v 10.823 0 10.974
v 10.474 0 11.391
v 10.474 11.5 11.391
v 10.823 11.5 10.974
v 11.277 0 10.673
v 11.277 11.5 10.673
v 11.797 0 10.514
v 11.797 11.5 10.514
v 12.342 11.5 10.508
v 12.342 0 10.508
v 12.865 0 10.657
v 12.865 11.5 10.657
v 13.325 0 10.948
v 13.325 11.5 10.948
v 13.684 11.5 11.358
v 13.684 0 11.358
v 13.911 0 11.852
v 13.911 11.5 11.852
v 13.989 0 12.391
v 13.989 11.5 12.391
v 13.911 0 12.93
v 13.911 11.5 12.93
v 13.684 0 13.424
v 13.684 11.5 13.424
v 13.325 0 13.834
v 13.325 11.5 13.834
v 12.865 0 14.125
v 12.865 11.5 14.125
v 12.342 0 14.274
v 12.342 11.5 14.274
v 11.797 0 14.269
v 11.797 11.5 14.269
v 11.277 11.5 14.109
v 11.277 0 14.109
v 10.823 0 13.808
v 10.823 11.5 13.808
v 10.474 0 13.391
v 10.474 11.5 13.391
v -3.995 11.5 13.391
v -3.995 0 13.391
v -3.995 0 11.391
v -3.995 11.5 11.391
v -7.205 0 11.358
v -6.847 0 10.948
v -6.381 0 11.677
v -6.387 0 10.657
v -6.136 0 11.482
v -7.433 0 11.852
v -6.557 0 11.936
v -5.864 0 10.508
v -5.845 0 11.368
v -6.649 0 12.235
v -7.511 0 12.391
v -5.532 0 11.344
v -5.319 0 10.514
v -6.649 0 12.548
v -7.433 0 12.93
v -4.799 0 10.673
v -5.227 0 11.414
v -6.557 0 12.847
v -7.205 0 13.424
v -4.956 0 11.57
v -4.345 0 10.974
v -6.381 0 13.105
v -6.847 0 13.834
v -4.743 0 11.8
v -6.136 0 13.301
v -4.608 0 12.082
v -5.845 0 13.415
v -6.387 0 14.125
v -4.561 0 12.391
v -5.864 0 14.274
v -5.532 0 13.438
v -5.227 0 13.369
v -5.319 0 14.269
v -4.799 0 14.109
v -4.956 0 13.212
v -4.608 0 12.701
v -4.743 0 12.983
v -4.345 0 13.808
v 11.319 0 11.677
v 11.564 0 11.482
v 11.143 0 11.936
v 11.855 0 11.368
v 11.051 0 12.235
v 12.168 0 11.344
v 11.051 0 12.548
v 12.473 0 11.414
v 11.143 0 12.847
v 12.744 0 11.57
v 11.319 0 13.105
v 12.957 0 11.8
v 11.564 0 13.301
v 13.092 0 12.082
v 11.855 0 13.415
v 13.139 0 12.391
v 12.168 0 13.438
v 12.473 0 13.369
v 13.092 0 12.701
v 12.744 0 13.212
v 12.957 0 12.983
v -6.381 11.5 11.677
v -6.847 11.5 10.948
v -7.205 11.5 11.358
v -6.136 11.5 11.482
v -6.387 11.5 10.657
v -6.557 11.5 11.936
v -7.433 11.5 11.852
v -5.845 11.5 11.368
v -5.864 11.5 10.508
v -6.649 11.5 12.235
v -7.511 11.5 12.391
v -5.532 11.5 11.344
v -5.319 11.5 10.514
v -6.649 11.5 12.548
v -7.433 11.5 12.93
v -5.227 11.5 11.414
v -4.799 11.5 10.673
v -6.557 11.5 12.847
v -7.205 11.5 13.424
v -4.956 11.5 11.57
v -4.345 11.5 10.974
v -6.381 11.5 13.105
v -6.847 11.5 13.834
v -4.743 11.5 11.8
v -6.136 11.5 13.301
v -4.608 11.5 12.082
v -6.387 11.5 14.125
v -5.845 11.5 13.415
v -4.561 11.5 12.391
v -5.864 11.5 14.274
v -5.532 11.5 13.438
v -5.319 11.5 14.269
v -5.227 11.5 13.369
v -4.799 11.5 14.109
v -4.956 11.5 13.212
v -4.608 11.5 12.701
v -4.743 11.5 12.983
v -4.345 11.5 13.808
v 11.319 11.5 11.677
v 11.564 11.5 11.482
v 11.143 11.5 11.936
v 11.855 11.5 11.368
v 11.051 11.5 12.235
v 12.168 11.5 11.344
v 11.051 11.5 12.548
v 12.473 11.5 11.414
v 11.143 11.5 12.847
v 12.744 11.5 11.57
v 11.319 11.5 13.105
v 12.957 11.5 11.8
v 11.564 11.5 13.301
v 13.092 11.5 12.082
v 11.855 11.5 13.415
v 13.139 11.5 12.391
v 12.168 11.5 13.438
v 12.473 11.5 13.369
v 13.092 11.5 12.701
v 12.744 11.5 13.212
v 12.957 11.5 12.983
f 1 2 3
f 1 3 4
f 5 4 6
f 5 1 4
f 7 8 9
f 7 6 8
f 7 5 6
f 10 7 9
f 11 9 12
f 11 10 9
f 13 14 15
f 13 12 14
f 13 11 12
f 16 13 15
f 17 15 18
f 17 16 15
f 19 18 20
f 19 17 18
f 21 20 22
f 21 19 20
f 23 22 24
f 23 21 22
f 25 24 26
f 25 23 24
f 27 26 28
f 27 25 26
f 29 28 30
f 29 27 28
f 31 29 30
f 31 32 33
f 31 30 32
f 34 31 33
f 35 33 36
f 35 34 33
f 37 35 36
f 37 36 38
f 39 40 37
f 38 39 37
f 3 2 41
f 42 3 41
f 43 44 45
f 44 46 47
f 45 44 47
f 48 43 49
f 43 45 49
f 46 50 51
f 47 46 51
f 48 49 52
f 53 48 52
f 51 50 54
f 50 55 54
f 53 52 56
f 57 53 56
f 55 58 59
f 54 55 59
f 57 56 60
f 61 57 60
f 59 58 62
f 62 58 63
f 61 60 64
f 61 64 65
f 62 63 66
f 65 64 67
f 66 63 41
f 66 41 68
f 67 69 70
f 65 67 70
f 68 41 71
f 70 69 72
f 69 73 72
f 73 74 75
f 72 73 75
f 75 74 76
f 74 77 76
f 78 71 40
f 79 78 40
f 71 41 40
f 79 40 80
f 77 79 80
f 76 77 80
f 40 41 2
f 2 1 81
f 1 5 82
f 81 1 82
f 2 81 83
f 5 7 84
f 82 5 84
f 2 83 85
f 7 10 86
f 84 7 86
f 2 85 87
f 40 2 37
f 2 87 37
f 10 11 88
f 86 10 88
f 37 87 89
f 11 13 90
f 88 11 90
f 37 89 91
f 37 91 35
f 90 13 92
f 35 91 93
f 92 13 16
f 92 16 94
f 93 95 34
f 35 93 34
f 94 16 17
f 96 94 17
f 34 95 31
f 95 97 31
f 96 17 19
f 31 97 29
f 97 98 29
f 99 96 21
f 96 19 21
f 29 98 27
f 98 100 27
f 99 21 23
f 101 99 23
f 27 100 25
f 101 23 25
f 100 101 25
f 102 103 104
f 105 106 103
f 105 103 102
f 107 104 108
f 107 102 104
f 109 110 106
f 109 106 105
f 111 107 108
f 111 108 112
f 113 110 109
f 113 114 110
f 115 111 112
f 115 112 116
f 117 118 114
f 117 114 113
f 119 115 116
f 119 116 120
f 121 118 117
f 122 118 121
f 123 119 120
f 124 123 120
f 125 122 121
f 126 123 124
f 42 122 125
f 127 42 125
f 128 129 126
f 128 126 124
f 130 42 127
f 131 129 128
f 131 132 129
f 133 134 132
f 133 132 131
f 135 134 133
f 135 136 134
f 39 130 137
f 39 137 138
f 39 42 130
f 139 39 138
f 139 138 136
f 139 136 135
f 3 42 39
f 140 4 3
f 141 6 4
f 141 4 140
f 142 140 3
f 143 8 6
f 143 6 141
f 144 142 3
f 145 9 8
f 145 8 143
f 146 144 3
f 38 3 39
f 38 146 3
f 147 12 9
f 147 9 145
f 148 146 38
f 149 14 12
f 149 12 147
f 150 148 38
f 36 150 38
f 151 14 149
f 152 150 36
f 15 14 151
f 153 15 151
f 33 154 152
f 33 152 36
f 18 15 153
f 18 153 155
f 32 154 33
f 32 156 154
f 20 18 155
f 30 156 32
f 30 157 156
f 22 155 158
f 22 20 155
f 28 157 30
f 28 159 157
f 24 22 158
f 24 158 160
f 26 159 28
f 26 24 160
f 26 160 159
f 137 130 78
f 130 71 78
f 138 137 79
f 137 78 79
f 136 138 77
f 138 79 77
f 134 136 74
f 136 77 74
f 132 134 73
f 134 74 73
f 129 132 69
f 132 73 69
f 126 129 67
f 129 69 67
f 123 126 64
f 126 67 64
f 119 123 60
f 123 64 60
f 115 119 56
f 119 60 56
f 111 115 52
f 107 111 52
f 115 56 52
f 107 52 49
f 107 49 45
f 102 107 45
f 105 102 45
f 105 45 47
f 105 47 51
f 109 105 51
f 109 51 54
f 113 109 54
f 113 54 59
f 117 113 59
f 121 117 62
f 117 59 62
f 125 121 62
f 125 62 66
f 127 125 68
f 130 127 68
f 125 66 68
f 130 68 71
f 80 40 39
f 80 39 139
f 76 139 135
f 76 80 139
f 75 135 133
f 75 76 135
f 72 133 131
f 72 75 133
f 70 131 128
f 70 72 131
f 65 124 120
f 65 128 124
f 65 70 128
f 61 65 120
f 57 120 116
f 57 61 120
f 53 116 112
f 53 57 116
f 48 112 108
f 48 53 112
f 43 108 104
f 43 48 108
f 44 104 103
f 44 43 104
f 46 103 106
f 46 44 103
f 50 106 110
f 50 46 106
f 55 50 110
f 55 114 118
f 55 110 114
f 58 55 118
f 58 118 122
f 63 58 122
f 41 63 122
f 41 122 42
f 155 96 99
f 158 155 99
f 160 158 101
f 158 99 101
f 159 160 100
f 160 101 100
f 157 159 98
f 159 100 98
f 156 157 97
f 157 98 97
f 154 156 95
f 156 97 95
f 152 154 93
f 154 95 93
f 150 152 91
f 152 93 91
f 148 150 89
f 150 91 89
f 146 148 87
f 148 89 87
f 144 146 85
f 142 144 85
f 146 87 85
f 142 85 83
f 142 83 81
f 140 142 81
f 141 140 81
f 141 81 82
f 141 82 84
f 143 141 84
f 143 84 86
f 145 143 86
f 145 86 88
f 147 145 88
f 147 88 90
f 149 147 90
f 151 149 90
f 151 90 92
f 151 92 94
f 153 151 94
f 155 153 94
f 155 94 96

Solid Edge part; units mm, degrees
sketch "Sketch1" plane through (0, 0, 0) normal (0, -1, 0) x (1, 0, 0)
  circle A0 centre (-5.6109, 12.3912) radius 1.05
  circle A1 centre (12.0891, 12.3912) radius 1.05
  line L0 (-3.9954, 13.3912) -> (10.4735, 13.3912)
  line L1 (10.4735, 11.3912) -> (-3.9954, 11.3912)
  arc A2 (-3.9954, 11.3912) -> (-3.9954, 13.3912) centre (-5.6109, 12.3912) cw
  arc A3 (10.4735, 13.3912) -> (10.4735, 11.3912) centre (12.0891, 12.3912) cw
extrude "Protrusion1" add sketch "Sketch1" against normal blind 11.5
